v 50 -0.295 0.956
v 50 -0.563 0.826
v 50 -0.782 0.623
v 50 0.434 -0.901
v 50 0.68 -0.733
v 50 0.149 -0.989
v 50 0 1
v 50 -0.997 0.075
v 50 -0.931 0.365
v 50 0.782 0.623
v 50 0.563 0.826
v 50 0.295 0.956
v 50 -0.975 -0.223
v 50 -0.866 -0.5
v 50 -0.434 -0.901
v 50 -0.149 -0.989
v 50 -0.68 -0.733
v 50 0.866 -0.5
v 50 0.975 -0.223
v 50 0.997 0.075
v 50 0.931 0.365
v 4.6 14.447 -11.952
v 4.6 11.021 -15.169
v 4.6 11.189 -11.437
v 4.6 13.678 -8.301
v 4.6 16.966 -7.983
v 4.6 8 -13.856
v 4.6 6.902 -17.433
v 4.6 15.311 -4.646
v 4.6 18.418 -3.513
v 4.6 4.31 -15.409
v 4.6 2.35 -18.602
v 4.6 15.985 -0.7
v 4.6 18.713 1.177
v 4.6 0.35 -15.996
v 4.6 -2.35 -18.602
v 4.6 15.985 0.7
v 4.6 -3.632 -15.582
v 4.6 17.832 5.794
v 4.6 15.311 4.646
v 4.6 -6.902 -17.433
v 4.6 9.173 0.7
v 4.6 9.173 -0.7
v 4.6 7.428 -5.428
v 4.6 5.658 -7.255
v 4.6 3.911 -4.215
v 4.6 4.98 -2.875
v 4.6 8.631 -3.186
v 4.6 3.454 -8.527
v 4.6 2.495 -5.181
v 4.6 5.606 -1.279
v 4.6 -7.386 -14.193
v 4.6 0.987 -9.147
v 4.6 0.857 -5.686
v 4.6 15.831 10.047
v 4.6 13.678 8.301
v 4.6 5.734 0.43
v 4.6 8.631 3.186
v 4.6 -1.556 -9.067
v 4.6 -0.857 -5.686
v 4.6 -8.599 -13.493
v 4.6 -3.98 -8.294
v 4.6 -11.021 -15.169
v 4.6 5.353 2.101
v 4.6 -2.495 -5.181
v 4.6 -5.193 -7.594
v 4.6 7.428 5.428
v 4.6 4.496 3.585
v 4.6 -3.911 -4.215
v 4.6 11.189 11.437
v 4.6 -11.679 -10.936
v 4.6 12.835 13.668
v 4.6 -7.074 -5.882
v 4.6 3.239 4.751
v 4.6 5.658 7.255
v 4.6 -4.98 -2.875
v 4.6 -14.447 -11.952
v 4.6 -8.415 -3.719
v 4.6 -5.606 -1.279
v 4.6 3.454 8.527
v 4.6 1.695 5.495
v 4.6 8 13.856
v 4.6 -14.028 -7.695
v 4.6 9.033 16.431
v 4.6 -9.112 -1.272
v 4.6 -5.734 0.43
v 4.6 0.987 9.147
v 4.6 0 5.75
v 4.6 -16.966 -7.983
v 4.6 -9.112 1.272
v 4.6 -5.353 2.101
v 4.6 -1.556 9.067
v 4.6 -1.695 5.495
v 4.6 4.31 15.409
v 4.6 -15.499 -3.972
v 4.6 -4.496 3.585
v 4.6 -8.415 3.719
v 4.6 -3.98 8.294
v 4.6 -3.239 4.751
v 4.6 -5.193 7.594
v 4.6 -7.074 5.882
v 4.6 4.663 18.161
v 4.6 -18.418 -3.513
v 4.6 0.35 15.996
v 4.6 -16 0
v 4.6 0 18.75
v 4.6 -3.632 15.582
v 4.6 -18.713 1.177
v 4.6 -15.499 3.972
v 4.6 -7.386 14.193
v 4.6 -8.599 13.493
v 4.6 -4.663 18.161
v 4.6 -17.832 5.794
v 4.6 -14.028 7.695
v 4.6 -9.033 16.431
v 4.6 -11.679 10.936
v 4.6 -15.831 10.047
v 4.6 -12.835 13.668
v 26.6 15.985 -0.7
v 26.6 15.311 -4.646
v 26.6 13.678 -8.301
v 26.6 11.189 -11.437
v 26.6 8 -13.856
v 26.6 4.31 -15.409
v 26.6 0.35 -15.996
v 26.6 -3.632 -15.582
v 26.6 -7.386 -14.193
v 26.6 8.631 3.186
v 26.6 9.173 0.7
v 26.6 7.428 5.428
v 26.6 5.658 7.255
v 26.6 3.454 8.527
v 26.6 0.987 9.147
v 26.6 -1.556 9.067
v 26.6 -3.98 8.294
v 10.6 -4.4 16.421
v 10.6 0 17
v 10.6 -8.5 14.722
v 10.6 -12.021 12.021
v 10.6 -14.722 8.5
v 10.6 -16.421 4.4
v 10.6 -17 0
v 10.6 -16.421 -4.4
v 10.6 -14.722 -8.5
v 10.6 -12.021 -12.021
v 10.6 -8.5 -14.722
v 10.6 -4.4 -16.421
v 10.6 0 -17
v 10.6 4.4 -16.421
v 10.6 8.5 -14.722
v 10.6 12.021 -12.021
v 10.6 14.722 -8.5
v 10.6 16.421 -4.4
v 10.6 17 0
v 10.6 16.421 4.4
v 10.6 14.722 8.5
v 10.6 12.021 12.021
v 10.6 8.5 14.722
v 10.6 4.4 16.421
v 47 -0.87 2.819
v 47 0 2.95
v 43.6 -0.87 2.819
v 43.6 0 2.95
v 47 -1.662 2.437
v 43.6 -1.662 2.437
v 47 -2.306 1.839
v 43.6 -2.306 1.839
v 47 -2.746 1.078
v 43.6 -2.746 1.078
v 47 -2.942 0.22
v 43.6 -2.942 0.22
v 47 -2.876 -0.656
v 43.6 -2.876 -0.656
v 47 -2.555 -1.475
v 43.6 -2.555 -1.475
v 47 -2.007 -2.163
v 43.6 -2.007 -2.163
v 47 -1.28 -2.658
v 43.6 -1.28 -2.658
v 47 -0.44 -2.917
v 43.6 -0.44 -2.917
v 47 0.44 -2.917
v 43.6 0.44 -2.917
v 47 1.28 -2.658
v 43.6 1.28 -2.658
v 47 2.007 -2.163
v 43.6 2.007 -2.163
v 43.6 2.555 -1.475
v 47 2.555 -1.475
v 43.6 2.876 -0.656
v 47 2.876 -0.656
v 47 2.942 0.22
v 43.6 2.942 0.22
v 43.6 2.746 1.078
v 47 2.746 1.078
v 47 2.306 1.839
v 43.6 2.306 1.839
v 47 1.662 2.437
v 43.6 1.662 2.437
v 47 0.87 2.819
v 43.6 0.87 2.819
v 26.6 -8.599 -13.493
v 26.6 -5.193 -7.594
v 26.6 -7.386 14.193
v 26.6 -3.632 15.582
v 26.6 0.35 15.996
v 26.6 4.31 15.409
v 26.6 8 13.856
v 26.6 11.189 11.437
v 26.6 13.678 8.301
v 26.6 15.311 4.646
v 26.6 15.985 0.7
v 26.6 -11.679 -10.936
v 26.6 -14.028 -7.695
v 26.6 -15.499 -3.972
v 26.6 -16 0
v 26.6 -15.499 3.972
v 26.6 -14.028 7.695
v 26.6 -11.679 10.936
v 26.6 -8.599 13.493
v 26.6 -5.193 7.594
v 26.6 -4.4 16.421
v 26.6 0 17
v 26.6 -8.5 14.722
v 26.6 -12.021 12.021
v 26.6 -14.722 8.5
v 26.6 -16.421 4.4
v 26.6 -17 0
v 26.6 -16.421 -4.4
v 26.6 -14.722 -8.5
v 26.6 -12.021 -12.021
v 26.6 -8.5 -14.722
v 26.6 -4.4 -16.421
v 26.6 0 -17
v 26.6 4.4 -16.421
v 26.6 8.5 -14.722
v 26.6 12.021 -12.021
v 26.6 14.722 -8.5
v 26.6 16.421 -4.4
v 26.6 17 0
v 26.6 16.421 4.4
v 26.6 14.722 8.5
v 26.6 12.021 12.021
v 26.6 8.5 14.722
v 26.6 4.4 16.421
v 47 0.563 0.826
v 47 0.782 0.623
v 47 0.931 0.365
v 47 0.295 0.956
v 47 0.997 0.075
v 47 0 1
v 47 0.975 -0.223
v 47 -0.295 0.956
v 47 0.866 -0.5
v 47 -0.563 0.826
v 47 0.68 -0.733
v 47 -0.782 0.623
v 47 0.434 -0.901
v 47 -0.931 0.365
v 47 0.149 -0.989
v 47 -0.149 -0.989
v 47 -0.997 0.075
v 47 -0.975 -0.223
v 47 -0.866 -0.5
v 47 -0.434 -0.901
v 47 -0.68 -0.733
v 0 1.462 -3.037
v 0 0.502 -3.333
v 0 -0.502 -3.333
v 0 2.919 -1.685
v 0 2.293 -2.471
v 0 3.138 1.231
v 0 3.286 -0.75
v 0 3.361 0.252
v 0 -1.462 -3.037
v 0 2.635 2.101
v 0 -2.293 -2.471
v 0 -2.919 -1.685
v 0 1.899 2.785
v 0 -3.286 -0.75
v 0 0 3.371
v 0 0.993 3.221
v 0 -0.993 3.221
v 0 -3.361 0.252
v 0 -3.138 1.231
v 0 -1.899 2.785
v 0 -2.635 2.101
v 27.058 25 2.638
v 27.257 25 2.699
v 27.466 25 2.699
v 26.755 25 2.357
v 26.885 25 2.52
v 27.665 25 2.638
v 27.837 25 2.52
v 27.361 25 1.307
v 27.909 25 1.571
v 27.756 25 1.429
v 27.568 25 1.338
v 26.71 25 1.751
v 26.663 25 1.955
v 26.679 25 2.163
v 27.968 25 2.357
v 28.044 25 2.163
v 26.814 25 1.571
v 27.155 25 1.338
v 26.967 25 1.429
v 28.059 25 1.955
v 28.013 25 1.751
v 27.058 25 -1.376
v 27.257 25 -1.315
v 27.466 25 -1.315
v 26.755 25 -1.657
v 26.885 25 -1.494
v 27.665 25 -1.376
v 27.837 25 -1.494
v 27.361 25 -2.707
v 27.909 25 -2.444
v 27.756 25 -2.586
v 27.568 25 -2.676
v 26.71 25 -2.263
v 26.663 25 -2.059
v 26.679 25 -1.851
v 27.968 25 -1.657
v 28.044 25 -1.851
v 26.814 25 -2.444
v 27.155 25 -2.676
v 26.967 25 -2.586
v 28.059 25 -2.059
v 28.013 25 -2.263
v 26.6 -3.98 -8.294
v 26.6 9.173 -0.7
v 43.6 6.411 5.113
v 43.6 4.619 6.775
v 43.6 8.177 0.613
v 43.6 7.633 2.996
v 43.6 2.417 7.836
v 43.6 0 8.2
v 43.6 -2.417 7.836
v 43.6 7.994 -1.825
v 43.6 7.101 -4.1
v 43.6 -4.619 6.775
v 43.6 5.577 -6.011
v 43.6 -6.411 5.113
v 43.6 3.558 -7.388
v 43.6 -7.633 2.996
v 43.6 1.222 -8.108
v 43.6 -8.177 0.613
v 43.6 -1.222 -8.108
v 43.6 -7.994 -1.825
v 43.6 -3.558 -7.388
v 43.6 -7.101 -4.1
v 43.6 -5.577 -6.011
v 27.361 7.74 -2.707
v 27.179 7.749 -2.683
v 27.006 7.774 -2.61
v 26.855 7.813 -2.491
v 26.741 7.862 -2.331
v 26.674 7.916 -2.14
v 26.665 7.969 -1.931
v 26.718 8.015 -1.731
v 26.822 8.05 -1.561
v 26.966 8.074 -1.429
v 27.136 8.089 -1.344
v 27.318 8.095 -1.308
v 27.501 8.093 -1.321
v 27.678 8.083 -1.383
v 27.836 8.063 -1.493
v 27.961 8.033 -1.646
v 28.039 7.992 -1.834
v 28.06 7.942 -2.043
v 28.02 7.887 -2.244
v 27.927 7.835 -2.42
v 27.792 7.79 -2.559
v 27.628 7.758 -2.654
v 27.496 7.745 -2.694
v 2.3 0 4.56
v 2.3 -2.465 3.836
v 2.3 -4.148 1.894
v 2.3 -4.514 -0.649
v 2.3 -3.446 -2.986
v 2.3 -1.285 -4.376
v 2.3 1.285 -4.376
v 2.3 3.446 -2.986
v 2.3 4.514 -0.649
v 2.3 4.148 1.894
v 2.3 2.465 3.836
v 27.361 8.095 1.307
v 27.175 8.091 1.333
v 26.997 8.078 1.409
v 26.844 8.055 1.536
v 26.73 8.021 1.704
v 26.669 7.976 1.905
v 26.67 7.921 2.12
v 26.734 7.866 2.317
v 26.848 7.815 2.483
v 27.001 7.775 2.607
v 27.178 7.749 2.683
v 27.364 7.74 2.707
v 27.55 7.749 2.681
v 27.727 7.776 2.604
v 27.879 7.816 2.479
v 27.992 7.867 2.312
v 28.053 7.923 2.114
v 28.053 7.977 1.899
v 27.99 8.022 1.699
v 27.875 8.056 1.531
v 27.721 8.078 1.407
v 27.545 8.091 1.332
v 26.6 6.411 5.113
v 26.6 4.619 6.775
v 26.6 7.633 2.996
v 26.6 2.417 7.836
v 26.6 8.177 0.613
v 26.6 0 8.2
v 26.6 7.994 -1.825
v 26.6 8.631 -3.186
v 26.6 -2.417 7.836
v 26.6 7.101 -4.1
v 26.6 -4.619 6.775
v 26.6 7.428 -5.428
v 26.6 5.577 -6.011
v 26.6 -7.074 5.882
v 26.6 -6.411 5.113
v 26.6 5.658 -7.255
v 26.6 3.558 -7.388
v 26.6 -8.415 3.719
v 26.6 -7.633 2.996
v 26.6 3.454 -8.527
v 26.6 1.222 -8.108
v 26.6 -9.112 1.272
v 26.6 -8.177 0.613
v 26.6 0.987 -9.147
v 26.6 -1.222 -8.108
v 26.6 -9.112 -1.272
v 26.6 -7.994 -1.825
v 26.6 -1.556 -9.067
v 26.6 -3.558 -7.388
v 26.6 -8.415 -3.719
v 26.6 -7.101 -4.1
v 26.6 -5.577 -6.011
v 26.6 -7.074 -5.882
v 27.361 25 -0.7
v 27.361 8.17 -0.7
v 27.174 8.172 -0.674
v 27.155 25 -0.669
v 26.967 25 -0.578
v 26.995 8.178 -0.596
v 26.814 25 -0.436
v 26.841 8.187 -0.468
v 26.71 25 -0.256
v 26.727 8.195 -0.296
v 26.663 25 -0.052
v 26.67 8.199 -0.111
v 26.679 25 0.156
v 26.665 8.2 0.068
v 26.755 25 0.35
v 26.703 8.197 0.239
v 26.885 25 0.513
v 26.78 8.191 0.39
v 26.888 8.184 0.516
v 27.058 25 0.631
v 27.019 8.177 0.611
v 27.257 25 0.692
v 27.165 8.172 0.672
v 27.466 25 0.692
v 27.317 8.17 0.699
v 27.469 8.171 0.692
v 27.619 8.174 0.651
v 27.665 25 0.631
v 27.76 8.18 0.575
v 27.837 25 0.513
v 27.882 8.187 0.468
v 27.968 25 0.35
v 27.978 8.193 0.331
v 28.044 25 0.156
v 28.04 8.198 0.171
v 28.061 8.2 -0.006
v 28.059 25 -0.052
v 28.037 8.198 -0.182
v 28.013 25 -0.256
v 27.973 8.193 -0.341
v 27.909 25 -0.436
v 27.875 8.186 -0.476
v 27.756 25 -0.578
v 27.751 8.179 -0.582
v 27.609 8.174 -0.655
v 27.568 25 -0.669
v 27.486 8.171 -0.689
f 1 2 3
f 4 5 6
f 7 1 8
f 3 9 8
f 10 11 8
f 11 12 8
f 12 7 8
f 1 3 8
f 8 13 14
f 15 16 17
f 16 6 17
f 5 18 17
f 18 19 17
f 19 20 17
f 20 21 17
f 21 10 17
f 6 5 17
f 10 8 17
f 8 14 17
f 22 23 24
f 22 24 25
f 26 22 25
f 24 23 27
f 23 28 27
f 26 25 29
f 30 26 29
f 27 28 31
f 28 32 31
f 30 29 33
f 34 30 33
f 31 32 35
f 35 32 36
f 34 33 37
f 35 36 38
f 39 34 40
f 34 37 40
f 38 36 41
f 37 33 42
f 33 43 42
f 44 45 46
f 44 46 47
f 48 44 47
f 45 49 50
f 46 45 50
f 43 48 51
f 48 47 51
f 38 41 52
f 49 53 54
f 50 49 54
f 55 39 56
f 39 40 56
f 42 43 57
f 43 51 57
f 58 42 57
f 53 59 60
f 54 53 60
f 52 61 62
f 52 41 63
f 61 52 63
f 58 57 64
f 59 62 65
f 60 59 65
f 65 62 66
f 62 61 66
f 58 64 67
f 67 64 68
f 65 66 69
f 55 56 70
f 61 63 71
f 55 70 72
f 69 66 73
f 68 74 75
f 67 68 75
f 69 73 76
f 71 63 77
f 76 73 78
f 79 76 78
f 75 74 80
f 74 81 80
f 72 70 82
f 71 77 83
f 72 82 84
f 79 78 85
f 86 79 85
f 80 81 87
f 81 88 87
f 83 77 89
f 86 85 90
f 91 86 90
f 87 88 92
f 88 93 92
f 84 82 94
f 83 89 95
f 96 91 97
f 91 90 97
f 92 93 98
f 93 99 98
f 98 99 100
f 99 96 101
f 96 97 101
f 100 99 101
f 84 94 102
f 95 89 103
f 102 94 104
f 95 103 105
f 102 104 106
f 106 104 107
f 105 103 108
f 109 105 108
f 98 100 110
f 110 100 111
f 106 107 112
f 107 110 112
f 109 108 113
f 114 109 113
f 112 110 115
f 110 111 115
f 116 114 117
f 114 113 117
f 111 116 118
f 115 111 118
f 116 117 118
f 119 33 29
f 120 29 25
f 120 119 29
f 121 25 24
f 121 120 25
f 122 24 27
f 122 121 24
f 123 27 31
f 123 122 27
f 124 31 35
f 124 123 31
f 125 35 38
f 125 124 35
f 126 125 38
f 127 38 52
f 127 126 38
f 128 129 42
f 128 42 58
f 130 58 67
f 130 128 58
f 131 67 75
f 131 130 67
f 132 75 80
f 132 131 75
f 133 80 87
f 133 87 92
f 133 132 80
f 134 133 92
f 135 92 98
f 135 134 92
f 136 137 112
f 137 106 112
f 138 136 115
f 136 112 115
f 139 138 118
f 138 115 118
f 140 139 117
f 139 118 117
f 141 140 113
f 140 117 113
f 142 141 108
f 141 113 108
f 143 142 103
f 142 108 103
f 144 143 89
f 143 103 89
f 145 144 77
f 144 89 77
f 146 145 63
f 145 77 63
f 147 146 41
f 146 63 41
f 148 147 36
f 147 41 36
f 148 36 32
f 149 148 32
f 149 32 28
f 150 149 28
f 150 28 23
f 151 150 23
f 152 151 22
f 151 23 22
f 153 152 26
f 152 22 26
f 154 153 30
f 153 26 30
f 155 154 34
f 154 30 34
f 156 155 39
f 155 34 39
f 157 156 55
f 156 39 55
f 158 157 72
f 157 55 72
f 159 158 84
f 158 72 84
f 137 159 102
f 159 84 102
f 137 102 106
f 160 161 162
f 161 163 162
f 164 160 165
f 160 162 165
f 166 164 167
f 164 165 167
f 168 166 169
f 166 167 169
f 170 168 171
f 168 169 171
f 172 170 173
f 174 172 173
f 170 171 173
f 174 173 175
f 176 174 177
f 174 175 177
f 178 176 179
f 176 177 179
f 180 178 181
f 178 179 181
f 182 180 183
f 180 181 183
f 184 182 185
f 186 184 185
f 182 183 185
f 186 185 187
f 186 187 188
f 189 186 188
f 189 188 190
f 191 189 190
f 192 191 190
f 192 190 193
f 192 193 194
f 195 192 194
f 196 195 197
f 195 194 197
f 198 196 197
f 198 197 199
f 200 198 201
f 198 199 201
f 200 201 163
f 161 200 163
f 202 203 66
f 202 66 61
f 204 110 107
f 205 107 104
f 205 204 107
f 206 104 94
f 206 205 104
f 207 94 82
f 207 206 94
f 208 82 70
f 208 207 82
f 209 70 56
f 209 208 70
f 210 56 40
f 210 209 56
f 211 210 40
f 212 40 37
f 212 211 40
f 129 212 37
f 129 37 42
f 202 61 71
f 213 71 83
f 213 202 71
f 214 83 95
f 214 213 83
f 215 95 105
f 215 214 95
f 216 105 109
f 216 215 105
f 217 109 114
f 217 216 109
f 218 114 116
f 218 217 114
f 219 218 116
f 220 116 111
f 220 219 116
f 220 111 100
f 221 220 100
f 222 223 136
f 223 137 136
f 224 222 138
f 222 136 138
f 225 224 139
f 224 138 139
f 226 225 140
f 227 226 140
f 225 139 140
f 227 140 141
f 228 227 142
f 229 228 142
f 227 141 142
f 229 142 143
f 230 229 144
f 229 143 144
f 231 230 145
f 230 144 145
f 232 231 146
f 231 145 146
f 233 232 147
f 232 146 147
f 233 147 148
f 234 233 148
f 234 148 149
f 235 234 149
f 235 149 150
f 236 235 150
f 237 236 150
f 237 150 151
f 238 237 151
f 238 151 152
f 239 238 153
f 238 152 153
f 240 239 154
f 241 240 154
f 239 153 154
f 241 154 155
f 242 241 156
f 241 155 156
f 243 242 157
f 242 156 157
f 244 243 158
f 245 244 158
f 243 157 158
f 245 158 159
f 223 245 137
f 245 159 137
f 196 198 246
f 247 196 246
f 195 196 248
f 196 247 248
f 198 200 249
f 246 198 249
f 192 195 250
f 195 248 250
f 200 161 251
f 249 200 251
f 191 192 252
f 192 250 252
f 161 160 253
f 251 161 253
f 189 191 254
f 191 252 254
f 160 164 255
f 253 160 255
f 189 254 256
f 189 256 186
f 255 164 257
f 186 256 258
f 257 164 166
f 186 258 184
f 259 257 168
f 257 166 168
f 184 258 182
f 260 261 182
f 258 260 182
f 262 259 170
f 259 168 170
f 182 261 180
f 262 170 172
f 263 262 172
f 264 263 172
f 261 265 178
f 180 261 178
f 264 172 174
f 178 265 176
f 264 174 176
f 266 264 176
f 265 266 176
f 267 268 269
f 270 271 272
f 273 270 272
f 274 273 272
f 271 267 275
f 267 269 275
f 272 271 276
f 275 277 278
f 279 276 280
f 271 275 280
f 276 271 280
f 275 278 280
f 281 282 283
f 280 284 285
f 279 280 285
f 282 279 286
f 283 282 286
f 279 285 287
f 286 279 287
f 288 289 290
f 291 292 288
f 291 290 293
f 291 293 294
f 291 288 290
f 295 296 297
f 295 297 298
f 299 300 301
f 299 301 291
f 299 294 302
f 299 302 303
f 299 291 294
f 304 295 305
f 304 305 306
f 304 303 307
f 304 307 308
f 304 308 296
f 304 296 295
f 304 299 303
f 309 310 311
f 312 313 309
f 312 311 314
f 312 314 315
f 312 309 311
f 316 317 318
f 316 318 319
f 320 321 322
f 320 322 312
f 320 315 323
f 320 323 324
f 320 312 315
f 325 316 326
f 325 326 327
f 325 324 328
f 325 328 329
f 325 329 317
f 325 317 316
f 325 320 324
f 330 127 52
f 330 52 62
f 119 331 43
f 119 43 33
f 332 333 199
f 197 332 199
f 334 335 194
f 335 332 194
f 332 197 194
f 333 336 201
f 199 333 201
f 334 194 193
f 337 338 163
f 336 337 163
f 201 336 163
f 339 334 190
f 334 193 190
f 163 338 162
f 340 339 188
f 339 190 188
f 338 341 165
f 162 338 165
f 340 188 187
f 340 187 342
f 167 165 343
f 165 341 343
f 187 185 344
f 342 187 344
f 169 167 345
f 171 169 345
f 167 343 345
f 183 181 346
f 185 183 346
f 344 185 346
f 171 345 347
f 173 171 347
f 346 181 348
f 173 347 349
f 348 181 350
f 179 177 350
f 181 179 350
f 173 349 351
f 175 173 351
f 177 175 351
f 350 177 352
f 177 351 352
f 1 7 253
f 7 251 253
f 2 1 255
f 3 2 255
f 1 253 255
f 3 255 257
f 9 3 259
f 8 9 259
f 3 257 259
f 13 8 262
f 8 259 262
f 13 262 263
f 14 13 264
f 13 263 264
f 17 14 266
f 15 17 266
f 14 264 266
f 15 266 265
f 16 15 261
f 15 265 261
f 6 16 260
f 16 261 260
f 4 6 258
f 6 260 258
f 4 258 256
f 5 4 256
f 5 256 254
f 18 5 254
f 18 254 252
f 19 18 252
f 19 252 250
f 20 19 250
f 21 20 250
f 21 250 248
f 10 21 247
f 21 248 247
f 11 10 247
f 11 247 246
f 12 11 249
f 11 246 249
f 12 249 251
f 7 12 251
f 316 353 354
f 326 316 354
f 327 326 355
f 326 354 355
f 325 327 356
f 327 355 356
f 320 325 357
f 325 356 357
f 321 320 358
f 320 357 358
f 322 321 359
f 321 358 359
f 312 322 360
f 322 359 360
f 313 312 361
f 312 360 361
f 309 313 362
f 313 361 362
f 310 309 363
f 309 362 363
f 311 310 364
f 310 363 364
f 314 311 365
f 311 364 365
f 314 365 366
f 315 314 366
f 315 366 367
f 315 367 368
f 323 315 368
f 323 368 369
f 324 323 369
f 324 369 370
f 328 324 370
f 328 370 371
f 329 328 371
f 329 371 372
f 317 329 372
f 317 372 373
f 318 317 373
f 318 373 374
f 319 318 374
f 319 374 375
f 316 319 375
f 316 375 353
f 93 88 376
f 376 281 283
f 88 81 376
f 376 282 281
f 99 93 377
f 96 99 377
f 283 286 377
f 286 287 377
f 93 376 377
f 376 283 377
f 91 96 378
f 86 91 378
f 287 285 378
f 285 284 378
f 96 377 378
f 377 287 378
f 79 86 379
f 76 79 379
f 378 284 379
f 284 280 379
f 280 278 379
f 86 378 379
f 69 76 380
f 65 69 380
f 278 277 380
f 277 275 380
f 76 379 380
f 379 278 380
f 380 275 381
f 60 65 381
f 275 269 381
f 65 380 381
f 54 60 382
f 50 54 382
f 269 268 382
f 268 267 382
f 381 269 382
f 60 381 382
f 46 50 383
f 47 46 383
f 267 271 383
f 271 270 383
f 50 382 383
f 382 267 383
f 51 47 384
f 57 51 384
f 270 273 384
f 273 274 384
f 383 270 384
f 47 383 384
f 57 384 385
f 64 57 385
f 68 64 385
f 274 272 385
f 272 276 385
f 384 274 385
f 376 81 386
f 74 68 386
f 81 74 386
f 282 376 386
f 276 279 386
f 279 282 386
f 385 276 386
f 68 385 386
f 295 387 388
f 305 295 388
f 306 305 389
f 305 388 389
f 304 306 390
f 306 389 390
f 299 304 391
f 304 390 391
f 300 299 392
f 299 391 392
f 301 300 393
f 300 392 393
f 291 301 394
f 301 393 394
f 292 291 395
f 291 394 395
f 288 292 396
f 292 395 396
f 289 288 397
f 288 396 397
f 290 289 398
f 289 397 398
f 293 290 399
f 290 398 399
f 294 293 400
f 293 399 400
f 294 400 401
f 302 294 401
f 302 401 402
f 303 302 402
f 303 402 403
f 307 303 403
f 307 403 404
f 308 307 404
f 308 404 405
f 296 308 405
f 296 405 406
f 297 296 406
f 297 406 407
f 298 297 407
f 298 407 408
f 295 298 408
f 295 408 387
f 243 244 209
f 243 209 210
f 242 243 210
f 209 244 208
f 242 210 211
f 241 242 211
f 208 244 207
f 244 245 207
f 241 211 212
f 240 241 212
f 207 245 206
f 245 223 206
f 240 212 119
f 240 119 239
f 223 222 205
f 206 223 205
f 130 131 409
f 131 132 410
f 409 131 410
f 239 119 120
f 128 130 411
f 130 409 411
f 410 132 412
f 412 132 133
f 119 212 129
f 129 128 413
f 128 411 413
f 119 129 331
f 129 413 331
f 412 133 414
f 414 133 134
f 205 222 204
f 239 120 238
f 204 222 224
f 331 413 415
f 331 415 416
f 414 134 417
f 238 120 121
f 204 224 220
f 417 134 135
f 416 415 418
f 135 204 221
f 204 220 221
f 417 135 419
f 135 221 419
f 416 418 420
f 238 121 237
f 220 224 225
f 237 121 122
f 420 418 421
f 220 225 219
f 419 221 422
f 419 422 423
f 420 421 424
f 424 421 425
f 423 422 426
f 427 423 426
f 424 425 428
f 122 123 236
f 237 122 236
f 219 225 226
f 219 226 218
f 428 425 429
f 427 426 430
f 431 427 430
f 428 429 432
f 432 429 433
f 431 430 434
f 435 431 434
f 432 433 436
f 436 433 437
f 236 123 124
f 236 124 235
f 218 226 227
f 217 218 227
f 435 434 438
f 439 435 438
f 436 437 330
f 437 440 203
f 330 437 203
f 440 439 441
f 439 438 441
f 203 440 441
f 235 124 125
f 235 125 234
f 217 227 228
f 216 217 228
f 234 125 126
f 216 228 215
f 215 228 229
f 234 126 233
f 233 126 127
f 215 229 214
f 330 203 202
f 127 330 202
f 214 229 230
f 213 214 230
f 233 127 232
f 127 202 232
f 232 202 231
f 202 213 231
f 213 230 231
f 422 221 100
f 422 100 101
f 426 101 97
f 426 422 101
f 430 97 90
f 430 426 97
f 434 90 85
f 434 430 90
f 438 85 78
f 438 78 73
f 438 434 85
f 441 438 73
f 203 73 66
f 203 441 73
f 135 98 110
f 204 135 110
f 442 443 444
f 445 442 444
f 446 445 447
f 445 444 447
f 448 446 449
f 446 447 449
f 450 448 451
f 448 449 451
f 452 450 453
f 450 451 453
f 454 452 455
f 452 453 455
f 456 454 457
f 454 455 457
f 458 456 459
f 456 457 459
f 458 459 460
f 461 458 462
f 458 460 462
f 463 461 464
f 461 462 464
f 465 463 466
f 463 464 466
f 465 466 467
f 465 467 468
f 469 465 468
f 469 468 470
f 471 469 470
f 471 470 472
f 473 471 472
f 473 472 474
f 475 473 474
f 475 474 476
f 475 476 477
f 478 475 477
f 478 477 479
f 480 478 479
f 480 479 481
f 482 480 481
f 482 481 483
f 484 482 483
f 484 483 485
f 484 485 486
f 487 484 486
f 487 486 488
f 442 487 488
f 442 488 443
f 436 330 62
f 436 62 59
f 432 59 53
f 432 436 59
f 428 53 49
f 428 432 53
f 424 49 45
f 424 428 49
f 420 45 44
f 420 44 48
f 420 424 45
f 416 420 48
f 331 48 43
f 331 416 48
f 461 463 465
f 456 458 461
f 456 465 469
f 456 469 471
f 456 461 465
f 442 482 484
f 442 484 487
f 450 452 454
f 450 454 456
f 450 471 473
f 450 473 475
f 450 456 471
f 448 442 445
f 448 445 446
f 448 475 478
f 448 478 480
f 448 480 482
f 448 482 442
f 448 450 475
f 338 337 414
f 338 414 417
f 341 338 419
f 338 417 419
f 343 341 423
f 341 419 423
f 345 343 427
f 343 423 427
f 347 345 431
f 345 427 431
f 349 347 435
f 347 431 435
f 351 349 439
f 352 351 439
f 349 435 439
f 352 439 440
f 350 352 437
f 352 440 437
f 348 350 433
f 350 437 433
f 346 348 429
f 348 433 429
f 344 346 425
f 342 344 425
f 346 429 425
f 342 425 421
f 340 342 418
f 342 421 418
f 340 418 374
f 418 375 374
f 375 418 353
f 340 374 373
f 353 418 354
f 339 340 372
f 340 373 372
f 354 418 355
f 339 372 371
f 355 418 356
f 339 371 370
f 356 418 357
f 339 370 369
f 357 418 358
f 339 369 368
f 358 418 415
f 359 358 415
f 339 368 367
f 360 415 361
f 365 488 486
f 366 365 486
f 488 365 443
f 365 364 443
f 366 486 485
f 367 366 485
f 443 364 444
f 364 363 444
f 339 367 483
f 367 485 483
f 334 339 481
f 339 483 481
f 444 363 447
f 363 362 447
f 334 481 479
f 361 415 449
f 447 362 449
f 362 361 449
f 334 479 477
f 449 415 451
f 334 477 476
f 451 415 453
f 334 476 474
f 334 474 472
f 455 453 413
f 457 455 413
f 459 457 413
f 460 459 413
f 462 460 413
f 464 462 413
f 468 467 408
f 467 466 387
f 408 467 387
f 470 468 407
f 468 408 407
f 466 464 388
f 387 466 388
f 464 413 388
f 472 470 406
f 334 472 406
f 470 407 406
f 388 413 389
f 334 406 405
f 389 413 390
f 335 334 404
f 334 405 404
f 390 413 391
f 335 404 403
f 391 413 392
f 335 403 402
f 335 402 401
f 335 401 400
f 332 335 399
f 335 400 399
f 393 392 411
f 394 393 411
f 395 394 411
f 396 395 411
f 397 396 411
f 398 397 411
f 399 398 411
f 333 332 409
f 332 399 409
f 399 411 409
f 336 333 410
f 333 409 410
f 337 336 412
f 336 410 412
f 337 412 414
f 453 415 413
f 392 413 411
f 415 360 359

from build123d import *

# Parameters (mm, degrees)
ENL_V_MAT_EXTRU_1_DEPTH      = 38.559086783
R_P_TITION_CIRCULAIRE1_COUNT = 3
ESQUISSE5_R                  = 0.7
BOSS_EXTRU_1_DEPTH           = 25


with BuildPart() as part:
    # Esquisse1 → Révolution1 (revolve)
    with BuildSketch(Plane.XY):
        Polygon((0, 0), (50, 0), (50, 1), (47, 1), (47, 2.95), (43.6, 2.95), (43.6, 8.2), (26.6, 8.2), (26.6, 17), (10.6, 17), (4.6, 18.75), (4.6, 5.75), (0, 3.370541895), align=None)
    revolve(axis=Axis((0, 0, 0), (1, 0, 0)))

    # Esquisse4 → Enlèv. mat.-Extru.1 (cut, through all)
    with BuildSketch(Plane(origin=(26.6, 0, 0), x_dir=(0, 0, -1), z_dir=(1, 0, 0))):
        with BuildLine():
            Line((-0.7, 15.984680166), (-0.7, 9.173330911))
            ThreePointArc((-0.7, 9.173330911), (-7.967433715, 4.6), (-8.294337606, -3.980447673))
            Line((-8.294337606, -3.980447673), (-14.193139095, -7.3861223))
            ThreePointArc((-14.193139095, -7.3861223), (-13.856406461, 8), (-0.7, 15.984680166))
        make_face()
    enl_v_mat_extru_1 = extrude(amount=-ENL_V_MAT_EXTRU_1_DEPTH, mode=Mode.SUBTRACT)

    # Répétition circulaire1: Enlèv. mat.-Extru.1 ×3 about axis
    r_p_tition_circulaire1_axis = Axis((45.207157615, 0, 0), (-1, 0, 0))
    for i in range(1, R_P_TITION_CIRCULAIRE1_COUNT):
        add(enl_v_mat_extru_1.rotate(r_p_tition_circulaire1_axis, i * 360 / R_P_TITION_CIRCULAIRE1_COUNT), mode=Mode.SUBTRACT)

    # Esquisse5 → Boss.-Extru.1 (add)
    with BuildSketch(Plane(origin=(0, 0, 0), x_dir=(1, 0, 0), z_dir=(0, 1, 0))):
        with Locations((27.361357126, 0)):
            Circle(ESQUISSE5_R)
        with Locations((27.361357126, 2.007154896)):
            Circle(ESQUISSE5_R)
        with Locations((27.361357126, -2.007154896)):
            Circle(ESQUISSE5_R)
    extrude(amount=BOSS_EXTRU_1_DEPTH)


solid = part.part
